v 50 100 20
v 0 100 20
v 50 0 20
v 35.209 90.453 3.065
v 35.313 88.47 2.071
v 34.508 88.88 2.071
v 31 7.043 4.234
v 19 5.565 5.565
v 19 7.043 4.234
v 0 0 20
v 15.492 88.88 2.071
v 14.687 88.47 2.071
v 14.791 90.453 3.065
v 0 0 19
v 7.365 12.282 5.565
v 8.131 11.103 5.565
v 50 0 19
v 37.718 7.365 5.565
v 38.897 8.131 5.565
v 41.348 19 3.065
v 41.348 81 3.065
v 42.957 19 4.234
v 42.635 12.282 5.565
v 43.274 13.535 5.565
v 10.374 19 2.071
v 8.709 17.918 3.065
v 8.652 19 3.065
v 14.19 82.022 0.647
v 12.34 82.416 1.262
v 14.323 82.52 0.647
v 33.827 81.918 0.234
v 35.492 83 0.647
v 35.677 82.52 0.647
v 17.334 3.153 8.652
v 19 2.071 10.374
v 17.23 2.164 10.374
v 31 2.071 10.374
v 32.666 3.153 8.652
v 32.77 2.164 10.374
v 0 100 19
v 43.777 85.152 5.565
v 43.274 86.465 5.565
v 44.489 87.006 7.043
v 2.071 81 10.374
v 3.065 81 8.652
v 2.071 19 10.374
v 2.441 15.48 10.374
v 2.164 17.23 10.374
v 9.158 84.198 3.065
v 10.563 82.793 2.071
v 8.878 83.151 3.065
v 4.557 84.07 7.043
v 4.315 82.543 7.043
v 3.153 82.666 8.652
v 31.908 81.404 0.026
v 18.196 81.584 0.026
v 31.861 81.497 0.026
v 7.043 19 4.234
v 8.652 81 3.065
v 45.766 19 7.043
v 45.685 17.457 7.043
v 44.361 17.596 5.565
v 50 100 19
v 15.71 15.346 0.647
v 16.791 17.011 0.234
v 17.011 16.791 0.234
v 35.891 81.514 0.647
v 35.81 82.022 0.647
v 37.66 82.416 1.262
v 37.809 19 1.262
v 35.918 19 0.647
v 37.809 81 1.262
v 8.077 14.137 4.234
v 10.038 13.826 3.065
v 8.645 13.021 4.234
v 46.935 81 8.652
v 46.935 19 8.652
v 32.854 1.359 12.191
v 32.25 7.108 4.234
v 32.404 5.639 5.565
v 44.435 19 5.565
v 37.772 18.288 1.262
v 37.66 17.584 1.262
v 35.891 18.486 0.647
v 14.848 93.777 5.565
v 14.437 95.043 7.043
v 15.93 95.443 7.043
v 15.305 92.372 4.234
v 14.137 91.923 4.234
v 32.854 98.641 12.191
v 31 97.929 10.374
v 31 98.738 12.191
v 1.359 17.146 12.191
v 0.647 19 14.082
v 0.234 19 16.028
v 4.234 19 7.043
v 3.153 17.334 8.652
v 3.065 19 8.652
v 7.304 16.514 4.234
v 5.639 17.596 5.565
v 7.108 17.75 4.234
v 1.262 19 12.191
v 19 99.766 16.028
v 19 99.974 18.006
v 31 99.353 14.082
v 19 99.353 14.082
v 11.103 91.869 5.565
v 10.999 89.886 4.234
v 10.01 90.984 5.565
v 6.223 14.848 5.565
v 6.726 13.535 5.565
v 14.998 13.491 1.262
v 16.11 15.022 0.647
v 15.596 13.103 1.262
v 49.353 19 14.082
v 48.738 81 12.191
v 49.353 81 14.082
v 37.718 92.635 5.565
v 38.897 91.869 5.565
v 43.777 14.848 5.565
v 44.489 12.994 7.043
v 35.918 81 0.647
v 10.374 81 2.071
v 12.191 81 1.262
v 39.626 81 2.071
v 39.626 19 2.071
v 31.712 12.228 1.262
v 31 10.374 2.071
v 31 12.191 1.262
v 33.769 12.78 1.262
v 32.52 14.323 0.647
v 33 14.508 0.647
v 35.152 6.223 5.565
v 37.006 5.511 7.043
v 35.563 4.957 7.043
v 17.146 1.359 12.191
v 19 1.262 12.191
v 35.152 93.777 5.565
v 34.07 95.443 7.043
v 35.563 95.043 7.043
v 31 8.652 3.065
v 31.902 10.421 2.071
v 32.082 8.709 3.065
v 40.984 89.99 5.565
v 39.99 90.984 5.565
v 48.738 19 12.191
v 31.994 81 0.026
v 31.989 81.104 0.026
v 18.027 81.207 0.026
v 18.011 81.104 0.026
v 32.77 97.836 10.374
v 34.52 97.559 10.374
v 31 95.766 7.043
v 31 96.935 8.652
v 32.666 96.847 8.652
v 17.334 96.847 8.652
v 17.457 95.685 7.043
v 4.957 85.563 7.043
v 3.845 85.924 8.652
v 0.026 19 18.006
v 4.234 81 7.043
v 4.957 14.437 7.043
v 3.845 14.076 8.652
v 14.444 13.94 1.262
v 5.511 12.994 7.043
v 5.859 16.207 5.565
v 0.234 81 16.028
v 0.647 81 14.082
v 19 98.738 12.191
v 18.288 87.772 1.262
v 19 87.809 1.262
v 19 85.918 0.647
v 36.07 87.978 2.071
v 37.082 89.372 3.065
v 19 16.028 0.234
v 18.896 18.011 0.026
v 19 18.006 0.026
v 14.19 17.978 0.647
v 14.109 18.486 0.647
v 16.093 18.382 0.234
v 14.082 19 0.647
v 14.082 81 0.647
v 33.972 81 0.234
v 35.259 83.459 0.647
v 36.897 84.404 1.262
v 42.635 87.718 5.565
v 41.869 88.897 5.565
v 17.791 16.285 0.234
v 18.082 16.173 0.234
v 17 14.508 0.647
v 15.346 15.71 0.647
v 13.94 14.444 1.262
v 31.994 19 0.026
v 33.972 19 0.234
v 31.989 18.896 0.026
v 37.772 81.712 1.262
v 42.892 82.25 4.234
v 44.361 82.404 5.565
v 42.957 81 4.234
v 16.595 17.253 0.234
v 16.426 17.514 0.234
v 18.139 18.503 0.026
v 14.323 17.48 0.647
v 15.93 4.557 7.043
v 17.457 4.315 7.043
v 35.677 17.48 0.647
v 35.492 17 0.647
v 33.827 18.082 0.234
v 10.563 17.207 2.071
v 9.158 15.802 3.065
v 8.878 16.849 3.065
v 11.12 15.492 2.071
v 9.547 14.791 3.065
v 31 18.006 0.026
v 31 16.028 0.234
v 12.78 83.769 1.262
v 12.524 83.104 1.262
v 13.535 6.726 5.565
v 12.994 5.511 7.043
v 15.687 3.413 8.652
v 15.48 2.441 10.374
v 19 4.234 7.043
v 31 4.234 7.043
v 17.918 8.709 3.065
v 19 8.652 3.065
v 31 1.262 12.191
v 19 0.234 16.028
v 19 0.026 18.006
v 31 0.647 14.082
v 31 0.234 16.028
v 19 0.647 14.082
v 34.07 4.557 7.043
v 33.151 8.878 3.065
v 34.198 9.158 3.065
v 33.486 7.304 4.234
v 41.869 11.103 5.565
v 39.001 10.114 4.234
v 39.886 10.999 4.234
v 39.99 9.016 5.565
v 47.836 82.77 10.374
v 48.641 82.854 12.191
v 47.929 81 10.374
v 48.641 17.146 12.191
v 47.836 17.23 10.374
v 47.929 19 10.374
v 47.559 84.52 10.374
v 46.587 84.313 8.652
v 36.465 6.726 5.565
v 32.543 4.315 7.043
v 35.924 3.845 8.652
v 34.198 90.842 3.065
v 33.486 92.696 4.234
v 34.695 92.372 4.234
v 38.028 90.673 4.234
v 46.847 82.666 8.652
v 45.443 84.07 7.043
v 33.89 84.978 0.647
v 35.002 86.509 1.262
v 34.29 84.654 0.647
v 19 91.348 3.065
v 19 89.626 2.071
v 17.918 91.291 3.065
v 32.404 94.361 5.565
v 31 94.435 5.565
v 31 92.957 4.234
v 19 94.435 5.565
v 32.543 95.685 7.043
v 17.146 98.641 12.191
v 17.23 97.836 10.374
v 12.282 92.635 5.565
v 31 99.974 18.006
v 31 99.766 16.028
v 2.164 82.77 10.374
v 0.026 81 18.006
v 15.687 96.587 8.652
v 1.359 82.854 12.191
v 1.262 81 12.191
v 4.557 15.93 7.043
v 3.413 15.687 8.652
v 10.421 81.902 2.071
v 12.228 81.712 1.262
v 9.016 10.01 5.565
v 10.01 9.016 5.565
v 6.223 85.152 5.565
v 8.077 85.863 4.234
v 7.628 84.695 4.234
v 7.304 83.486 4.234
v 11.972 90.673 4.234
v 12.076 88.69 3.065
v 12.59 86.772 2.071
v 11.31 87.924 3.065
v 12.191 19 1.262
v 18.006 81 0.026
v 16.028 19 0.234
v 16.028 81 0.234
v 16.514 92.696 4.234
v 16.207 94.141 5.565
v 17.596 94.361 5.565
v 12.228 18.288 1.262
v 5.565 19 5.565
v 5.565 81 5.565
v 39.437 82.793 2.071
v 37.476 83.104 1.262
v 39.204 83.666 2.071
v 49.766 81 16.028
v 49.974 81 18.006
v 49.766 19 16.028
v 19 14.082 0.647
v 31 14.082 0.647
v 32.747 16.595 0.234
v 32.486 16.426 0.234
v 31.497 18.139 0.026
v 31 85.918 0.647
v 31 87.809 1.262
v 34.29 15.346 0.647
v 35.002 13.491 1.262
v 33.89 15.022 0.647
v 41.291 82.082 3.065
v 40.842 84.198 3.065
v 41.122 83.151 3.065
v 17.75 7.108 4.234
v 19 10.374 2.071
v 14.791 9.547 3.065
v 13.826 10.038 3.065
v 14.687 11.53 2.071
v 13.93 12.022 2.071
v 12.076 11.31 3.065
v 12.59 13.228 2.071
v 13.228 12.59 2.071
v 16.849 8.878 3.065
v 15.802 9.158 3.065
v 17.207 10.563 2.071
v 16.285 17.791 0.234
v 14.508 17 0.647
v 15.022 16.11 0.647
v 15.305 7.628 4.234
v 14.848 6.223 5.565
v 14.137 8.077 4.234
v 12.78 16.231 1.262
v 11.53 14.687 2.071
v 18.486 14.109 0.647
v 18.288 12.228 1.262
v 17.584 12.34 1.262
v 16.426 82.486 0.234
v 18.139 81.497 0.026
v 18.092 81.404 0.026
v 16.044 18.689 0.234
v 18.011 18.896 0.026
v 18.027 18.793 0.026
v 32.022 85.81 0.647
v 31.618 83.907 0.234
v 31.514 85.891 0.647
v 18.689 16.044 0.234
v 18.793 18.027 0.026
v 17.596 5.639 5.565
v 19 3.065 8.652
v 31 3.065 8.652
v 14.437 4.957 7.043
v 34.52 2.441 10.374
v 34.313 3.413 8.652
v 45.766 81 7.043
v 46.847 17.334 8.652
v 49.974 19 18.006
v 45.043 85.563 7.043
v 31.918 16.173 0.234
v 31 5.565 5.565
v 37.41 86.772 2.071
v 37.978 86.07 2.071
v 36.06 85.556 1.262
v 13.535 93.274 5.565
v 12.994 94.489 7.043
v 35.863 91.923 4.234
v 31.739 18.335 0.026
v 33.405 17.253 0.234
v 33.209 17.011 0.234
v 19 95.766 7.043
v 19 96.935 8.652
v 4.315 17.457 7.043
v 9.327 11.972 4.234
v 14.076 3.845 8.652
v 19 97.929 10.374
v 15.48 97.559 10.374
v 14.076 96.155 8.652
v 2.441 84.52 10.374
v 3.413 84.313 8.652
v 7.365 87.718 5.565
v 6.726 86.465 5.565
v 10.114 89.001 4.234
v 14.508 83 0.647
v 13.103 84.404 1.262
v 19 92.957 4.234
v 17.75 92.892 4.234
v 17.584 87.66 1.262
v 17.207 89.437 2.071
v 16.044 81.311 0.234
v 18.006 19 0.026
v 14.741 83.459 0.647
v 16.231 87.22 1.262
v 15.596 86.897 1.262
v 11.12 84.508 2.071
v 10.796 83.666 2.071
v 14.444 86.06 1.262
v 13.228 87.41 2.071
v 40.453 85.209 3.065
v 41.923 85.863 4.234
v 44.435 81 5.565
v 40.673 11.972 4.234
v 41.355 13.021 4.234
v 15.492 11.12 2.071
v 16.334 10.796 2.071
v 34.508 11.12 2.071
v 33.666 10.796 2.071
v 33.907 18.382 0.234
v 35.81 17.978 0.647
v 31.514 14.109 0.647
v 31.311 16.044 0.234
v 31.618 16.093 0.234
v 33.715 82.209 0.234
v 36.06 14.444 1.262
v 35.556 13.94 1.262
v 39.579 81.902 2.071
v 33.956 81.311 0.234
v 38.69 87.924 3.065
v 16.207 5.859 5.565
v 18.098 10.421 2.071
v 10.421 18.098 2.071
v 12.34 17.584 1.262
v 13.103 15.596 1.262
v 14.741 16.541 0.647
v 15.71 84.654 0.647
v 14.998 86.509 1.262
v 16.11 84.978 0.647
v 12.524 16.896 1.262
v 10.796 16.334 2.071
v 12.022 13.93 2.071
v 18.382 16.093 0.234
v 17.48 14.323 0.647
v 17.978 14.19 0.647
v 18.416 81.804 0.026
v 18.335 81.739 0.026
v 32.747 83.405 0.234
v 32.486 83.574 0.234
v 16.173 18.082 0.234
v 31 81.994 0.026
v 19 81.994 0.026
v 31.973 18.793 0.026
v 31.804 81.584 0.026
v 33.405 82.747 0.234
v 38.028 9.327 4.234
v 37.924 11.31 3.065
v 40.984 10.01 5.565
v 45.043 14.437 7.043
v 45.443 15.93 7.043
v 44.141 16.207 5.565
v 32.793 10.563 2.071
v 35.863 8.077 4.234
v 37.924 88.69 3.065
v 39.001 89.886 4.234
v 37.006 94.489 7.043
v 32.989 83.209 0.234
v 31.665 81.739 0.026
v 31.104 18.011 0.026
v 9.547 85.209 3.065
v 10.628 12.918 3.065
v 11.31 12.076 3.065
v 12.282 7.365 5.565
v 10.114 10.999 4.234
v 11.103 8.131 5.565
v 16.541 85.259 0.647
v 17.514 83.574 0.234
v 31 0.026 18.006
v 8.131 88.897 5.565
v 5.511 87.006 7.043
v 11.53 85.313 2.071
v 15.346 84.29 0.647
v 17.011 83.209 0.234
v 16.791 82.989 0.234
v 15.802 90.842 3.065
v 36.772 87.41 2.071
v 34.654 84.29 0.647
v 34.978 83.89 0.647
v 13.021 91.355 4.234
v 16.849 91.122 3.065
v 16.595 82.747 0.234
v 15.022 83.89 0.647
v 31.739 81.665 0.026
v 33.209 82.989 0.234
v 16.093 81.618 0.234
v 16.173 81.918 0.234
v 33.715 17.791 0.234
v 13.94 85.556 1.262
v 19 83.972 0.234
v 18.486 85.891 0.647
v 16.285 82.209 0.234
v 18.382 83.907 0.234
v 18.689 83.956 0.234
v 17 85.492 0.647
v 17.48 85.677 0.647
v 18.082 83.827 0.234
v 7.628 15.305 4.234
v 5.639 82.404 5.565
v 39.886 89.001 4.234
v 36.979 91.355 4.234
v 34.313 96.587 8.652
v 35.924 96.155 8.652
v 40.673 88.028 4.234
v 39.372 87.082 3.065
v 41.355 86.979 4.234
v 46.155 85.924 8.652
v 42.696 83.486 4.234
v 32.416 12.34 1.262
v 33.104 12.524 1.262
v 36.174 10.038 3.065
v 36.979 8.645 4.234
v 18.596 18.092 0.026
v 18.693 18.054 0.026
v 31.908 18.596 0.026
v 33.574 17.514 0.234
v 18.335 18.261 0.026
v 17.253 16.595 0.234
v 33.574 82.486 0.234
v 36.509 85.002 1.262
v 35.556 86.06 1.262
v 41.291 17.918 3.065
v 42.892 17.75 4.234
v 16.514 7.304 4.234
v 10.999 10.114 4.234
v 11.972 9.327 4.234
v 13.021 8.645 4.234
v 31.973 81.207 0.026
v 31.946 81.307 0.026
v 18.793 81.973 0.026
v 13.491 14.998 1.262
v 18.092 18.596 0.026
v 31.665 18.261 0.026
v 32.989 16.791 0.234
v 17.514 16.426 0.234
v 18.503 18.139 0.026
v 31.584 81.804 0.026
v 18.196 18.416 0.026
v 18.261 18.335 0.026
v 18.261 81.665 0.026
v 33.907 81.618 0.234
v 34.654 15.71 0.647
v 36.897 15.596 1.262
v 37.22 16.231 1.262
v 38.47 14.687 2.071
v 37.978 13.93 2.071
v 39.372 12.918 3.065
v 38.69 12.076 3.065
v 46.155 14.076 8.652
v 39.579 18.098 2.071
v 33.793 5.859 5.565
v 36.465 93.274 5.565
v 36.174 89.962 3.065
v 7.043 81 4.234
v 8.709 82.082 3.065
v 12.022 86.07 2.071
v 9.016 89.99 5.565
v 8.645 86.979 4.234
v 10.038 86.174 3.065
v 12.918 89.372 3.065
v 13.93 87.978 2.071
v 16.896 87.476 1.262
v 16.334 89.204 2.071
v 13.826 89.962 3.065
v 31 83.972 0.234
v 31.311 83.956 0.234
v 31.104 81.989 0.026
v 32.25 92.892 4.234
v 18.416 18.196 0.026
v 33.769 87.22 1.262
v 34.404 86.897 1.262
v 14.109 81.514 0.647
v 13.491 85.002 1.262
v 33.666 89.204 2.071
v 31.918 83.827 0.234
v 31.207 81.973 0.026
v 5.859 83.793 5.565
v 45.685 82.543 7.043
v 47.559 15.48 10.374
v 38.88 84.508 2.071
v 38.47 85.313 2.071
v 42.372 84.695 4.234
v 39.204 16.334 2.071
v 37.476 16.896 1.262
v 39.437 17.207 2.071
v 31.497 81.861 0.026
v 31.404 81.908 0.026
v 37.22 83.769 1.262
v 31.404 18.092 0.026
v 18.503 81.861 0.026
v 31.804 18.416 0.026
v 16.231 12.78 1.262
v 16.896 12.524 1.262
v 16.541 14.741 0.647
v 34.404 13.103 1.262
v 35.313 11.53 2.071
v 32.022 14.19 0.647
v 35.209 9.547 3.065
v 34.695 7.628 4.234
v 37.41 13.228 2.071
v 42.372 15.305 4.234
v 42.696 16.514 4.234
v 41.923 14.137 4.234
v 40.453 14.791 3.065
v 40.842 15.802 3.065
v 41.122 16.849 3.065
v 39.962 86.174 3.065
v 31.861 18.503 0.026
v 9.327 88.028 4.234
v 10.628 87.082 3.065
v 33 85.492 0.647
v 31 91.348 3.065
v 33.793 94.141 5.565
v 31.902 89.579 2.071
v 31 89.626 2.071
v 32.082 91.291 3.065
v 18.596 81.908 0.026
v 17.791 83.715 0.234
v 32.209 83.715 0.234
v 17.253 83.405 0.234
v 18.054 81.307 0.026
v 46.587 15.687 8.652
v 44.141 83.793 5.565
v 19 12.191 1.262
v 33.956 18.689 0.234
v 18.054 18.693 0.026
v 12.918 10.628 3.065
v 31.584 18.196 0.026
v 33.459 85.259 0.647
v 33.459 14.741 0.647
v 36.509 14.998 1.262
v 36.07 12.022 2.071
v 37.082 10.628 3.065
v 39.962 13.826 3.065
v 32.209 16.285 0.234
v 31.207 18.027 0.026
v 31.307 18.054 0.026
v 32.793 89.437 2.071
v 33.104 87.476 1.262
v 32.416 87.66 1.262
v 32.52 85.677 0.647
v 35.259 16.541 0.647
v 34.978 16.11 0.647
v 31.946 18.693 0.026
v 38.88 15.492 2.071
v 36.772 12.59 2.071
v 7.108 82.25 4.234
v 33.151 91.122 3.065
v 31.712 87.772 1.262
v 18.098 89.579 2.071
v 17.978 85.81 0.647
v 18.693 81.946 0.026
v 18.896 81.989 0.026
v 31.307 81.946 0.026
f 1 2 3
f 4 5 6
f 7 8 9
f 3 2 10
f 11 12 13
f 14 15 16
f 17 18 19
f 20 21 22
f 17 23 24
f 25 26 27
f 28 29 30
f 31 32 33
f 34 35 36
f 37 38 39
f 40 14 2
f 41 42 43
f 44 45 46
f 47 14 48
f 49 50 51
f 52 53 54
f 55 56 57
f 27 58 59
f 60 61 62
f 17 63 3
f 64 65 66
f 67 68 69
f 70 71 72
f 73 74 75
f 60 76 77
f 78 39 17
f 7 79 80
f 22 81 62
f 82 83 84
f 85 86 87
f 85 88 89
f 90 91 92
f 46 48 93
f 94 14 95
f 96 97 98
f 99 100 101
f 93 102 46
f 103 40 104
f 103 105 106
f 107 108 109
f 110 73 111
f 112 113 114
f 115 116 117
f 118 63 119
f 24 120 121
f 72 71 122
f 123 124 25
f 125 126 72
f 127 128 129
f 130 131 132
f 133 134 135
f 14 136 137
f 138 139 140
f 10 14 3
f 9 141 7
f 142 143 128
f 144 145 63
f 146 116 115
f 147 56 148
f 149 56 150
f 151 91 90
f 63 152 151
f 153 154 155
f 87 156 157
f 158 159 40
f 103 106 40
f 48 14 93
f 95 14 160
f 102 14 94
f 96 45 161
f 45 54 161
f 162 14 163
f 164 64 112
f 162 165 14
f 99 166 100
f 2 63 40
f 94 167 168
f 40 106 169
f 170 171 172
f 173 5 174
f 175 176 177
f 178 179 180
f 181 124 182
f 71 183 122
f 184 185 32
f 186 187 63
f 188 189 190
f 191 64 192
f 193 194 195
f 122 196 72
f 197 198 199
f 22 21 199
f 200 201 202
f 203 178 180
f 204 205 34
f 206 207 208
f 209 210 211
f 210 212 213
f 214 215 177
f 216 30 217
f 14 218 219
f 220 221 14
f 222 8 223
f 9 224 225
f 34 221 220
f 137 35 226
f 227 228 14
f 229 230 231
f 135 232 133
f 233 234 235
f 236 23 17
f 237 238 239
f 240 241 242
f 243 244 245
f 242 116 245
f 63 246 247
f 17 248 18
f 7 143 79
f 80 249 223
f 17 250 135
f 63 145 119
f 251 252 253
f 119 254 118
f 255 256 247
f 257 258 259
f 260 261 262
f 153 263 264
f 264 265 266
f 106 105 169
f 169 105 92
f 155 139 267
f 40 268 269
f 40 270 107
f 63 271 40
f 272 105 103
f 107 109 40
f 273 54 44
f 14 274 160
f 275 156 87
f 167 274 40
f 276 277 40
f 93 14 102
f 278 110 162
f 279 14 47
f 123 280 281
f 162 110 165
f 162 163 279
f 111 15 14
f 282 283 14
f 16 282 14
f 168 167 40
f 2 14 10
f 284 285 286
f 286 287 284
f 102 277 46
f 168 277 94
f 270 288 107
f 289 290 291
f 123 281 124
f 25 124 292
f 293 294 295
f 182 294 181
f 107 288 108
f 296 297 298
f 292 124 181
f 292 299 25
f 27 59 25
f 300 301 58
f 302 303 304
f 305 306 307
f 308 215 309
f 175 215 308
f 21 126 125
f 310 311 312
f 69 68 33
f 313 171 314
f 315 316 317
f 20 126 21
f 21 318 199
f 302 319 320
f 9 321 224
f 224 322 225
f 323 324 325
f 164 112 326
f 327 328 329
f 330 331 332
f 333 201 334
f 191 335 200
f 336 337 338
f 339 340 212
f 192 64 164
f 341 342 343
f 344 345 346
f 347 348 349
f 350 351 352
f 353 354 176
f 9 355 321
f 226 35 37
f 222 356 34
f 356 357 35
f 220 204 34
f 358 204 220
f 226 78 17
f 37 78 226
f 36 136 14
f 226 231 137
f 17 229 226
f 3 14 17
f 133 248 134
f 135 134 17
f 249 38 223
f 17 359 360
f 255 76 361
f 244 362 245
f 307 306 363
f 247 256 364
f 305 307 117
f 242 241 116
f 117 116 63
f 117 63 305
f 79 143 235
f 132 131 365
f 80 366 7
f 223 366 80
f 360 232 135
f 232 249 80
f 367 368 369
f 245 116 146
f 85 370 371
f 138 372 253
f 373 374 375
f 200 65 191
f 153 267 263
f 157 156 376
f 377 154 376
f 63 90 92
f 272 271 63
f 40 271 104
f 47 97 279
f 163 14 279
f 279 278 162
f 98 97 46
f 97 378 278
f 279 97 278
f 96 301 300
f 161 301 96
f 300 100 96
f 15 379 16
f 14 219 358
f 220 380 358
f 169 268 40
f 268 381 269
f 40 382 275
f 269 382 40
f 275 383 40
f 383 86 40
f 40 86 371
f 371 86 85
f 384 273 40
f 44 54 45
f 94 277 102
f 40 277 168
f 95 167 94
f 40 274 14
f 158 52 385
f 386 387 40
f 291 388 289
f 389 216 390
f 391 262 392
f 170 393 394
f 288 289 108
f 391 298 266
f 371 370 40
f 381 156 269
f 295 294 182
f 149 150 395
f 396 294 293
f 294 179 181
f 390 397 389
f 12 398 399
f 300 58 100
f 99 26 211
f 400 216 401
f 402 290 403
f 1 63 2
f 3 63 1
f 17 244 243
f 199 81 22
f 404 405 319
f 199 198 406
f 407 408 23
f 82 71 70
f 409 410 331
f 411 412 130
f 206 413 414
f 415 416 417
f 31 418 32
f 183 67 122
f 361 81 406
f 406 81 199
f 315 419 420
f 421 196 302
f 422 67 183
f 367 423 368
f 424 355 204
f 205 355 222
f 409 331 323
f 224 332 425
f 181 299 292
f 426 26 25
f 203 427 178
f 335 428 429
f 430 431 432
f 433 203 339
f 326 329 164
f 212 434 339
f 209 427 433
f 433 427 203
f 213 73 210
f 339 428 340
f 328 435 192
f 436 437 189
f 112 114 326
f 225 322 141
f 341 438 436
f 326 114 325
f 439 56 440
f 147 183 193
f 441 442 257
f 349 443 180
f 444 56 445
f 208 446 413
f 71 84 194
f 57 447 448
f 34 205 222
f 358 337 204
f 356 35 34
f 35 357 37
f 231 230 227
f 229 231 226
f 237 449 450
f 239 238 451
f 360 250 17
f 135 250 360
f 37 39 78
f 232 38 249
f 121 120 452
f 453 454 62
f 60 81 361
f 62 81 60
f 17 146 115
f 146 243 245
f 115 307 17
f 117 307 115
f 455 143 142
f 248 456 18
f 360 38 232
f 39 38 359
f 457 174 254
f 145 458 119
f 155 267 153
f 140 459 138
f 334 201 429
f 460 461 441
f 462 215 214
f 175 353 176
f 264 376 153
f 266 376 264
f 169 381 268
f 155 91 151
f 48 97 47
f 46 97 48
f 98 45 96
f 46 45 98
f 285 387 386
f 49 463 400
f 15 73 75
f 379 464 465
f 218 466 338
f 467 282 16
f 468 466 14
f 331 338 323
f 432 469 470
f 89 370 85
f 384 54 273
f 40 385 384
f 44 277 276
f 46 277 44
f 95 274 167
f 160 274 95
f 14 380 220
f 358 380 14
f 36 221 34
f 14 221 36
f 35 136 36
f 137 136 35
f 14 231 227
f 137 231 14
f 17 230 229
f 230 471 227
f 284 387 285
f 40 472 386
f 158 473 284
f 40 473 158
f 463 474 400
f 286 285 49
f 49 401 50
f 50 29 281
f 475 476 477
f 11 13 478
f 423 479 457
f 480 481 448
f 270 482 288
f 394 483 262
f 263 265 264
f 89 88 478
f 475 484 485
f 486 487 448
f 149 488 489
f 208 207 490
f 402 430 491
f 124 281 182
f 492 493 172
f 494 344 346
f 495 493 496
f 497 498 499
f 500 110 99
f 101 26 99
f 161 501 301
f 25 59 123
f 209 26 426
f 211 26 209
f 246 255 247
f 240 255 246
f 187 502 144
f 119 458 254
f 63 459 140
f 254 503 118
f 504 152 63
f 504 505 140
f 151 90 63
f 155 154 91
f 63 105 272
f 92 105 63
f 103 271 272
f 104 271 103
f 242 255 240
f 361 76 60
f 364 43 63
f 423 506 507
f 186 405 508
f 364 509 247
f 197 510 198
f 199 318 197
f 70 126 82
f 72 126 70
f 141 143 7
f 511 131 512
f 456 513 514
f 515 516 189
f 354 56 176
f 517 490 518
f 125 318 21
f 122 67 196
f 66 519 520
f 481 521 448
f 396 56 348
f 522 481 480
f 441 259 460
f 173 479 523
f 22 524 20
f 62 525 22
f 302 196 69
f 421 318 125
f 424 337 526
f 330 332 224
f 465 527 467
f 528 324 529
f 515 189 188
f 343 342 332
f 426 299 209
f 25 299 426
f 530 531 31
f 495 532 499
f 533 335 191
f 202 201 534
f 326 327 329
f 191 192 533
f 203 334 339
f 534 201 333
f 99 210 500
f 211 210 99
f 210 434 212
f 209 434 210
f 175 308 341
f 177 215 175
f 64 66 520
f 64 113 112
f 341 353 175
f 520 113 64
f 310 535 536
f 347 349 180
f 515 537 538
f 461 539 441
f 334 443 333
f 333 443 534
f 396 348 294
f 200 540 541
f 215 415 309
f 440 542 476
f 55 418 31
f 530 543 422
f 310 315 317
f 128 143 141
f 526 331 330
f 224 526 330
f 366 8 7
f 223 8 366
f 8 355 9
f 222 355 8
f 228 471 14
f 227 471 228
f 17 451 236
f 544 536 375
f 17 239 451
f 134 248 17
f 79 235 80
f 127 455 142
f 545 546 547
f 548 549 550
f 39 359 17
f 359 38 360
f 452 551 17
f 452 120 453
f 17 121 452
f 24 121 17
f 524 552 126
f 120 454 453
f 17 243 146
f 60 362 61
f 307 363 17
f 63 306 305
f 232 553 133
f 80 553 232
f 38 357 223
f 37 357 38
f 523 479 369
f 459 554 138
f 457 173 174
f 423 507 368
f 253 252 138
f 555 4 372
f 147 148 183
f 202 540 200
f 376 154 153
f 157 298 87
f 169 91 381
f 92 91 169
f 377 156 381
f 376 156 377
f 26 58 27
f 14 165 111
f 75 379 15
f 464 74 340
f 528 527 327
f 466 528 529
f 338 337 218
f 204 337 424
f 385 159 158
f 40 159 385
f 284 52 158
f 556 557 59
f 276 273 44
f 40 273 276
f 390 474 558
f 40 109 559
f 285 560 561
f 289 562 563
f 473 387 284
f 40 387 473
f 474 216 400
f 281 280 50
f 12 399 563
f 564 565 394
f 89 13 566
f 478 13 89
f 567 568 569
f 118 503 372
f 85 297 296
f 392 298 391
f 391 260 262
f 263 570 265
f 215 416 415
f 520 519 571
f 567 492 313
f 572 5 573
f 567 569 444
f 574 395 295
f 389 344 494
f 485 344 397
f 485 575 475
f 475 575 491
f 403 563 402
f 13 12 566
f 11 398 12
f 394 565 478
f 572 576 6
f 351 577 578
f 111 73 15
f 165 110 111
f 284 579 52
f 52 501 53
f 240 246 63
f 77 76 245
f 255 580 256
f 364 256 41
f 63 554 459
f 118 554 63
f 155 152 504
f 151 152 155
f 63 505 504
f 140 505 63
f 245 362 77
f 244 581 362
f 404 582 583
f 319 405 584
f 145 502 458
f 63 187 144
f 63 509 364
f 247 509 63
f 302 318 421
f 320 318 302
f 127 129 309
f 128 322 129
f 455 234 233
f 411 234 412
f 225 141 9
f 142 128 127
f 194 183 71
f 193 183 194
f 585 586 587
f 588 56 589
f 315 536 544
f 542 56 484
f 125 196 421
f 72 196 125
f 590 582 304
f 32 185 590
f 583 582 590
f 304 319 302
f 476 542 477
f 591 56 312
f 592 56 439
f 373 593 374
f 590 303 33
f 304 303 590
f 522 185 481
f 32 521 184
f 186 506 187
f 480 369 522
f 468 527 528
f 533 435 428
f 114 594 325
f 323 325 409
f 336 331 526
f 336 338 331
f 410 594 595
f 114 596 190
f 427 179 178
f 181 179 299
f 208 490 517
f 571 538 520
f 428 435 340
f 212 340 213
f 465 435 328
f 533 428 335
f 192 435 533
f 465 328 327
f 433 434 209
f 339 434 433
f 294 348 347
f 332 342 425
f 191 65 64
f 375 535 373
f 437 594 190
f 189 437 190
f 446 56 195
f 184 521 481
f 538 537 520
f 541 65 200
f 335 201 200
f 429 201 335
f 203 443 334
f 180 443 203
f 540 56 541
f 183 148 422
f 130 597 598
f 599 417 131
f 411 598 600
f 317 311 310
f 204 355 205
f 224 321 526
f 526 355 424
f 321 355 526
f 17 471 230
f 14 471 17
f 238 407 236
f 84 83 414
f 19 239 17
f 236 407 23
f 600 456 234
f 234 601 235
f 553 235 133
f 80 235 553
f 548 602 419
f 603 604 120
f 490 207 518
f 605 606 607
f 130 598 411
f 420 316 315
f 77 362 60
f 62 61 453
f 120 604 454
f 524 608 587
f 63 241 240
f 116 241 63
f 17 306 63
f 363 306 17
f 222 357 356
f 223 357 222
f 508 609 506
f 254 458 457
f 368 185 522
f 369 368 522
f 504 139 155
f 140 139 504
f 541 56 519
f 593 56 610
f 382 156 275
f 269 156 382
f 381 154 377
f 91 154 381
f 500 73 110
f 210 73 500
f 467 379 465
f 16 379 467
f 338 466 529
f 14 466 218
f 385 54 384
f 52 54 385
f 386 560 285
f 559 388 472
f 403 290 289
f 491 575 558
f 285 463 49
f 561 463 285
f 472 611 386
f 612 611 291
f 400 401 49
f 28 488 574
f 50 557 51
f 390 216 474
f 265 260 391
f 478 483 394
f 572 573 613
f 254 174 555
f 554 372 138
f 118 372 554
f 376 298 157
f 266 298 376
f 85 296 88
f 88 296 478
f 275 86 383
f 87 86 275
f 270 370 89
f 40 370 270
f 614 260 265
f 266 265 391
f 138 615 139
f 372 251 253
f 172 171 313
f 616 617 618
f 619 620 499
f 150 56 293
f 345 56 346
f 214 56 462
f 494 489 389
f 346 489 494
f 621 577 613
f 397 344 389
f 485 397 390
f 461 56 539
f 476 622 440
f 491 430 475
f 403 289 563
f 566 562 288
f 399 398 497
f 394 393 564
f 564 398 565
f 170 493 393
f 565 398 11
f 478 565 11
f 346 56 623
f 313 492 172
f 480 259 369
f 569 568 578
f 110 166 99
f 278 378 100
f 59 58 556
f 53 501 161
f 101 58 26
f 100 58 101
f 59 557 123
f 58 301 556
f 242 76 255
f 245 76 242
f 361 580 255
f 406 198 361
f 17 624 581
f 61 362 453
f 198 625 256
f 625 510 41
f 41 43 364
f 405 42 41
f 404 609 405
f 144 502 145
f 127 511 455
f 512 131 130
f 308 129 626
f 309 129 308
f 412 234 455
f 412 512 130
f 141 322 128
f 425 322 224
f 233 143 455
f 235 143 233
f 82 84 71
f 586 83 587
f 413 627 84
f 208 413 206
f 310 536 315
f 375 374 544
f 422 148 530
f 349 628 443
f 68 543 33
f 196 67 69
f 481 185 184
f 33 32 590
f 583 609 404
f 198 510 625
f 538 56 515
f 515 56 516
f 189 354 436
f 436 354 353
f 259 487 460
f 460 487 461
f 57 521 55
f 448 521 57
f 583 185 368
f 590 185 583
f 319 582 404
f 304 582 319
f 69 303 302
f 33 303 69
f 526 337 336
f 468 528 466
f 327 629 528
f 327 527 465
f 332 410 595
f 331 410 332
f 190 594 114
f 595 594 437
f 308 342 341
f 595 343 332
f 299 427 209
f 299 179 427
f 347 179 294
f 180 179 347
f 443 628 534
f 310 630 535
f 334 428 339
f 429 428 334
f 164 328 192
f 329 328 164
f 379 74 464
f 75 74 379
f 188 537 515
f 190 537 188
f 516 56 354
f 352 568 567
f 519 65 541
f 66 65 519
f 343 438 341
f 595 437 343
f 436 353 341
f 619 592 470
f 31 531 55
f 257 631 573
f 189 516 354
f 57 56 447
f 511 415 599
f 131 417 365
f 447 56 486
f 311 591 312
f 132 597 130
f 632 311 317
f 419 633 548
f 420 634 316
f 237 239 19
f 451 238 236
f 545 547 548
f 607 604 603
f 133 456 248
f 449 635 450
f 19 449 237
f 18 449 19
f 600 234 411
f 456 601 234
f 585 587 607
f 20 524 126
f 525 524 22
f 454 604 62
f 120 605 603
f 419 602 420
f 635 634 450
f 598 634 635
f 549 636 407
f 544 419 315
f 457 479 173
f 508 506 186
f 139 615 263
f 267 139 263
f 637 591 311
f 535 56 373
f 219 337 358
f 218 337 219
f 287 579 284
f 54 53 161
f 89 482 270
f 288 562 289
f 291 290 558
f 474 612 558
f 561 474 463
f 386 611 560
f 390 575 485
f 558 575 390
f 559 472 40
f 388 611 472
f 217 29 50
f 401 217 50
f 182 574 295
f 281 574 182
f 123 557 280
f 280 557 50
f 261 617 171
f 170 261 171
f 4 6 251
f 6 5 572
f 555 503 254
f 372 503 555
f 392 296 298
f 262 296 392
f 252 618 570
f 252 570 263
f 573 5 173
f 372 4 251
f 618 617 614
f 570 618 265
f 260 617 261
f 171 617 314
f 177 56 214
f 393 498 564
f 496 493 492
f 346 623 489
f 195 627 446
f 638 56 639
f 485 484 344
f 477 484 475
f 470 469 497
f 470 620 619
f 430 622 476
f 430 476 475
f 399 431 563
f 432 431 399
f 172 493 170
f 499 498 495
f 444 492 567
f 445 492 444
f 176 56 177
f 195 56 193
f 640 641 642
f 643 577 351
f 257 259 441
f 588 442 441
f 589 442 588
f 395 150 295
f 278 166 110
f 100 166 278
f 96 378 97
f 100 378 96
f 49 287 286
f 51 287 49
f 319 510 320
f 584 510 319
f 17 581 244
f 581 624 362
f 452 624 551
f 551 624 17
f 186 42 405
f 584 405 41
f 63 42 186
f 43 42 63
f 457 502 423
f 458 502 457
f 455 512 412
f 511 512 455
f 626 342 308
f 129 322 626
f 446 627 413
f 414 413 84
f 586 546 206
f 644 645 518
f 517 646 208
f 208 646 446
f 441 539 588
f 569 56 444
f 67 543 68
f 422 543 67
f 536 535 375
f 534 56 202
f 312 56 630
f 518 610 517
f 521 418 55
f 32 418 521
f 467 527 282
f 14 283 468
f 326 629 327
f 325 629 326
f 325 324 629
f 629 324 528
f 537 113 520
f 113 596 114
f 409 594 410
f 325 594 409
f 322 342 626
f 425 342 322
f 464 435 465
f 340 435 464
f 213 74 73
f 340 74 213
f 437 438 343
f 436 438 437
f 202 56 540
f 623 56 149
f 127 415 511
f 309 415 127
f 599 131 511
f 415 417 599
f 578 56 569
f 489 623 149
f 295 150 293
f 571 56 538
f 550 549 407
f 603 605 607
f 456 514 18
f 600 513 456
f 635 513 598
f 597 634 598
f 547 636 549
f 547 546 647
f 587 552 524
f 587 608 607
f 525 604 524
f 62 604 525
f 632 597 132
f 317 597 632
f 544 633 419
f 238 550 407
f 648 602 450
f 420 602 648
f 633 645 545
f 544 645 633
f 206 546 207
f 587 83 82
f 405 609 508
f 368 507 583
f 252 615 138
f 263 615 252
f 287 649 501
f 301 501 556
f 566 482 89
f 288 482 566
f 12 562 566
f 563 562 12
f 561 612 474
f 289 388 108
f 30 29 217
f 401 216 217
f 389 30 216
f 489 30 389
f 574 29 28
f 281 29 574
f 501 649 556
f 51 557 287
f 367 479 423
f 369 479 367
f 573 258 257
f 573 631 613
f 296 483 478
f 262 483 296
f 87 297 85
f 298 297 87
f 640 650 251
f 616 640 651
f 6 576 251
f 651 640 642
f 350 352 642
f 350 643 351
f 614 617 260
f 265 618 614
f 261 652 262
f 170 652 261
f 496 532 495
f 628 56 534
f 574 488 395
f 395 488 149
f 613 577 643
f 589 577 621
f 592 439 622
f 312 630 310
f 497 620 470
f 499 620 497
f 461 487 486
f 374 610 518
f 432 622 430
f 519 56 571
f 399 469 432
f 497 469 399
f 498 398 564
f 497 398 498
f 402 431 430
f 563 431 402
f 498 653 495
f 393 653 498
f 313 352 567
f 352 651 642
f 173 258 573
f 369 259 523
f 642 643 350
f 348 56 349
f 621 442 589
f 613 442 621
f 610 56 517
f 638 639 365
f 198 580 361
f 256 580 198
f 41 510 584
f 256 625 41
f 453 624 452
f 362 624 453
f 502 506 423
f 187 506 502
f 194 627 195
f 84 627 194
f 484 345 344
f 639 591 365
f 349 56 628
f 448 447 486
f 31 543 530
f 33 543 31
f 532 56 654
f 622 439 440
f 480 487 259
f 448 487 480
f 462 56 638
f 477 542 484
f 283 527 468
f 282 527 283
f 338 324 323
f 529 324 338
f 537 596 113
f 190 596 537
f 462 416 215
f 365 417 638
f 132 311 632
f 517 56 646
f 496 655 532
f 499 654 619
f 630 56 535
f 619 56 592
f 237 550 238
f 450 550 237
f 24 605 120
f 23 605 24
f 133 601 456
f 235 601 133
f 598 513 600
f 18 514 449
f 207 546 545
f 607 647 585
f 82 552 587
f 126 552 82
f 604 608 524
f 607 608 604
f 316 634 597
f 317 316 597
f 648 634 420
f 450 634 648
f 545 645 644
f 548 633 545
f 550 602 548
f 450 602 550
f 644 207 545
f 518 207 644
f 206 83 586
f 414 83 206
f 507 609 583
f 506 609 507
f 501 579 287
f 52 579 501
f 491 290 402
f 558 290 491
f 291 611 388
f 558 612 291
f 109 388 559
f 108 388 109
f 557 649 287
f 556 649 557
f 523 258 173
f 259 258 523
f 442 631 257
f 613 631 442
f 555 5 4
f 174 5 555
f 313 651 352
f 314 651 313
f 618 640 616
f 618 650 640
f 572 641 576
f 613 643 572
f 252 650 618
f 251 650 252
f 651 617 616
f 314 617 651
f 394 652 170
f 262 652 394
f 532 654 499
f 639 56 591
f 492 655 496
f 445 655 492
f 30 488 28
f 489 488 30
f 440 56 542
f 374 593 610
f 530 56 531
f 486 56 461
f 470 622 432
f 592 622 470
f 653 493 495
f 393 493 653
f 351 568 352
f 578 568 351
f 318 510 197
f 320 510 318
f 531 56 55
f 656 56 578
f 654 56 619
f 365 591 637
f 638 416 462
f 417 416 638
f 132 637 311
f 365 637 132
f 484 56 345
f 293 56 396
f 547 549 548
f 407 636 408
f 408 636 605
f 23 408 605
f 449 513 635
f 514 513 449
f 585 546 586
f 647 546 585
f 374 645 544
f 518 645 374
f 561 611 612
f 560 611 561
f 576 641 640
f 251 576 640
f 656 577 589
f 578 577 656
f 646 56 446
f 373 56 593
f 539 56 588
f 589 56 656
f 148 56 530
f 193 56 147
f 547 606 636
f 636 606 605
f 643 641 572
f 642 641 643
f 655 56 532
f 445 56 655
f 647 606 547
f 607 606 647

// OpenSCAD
module chamfer_base(length, width, height, chamfer_height){
      ch = chamfer_height;
      hull(){ // transition the corners from round to sharp
         translate([0, 0, ch]) cube([length, width, height - ch]); // top potion
         intersection(){ // chamfer section
            translate([ch, ch, ch]) minkowski() {
               cube([length-2*ch, width-2*ch, ch]);
               sphere(ch, $fn=60);
            }
            cube([length, width, ch]); // Make sure that we include just the bottom chamfer
         }
      }
}


chamfer_base(50, 100, 20, 19);
